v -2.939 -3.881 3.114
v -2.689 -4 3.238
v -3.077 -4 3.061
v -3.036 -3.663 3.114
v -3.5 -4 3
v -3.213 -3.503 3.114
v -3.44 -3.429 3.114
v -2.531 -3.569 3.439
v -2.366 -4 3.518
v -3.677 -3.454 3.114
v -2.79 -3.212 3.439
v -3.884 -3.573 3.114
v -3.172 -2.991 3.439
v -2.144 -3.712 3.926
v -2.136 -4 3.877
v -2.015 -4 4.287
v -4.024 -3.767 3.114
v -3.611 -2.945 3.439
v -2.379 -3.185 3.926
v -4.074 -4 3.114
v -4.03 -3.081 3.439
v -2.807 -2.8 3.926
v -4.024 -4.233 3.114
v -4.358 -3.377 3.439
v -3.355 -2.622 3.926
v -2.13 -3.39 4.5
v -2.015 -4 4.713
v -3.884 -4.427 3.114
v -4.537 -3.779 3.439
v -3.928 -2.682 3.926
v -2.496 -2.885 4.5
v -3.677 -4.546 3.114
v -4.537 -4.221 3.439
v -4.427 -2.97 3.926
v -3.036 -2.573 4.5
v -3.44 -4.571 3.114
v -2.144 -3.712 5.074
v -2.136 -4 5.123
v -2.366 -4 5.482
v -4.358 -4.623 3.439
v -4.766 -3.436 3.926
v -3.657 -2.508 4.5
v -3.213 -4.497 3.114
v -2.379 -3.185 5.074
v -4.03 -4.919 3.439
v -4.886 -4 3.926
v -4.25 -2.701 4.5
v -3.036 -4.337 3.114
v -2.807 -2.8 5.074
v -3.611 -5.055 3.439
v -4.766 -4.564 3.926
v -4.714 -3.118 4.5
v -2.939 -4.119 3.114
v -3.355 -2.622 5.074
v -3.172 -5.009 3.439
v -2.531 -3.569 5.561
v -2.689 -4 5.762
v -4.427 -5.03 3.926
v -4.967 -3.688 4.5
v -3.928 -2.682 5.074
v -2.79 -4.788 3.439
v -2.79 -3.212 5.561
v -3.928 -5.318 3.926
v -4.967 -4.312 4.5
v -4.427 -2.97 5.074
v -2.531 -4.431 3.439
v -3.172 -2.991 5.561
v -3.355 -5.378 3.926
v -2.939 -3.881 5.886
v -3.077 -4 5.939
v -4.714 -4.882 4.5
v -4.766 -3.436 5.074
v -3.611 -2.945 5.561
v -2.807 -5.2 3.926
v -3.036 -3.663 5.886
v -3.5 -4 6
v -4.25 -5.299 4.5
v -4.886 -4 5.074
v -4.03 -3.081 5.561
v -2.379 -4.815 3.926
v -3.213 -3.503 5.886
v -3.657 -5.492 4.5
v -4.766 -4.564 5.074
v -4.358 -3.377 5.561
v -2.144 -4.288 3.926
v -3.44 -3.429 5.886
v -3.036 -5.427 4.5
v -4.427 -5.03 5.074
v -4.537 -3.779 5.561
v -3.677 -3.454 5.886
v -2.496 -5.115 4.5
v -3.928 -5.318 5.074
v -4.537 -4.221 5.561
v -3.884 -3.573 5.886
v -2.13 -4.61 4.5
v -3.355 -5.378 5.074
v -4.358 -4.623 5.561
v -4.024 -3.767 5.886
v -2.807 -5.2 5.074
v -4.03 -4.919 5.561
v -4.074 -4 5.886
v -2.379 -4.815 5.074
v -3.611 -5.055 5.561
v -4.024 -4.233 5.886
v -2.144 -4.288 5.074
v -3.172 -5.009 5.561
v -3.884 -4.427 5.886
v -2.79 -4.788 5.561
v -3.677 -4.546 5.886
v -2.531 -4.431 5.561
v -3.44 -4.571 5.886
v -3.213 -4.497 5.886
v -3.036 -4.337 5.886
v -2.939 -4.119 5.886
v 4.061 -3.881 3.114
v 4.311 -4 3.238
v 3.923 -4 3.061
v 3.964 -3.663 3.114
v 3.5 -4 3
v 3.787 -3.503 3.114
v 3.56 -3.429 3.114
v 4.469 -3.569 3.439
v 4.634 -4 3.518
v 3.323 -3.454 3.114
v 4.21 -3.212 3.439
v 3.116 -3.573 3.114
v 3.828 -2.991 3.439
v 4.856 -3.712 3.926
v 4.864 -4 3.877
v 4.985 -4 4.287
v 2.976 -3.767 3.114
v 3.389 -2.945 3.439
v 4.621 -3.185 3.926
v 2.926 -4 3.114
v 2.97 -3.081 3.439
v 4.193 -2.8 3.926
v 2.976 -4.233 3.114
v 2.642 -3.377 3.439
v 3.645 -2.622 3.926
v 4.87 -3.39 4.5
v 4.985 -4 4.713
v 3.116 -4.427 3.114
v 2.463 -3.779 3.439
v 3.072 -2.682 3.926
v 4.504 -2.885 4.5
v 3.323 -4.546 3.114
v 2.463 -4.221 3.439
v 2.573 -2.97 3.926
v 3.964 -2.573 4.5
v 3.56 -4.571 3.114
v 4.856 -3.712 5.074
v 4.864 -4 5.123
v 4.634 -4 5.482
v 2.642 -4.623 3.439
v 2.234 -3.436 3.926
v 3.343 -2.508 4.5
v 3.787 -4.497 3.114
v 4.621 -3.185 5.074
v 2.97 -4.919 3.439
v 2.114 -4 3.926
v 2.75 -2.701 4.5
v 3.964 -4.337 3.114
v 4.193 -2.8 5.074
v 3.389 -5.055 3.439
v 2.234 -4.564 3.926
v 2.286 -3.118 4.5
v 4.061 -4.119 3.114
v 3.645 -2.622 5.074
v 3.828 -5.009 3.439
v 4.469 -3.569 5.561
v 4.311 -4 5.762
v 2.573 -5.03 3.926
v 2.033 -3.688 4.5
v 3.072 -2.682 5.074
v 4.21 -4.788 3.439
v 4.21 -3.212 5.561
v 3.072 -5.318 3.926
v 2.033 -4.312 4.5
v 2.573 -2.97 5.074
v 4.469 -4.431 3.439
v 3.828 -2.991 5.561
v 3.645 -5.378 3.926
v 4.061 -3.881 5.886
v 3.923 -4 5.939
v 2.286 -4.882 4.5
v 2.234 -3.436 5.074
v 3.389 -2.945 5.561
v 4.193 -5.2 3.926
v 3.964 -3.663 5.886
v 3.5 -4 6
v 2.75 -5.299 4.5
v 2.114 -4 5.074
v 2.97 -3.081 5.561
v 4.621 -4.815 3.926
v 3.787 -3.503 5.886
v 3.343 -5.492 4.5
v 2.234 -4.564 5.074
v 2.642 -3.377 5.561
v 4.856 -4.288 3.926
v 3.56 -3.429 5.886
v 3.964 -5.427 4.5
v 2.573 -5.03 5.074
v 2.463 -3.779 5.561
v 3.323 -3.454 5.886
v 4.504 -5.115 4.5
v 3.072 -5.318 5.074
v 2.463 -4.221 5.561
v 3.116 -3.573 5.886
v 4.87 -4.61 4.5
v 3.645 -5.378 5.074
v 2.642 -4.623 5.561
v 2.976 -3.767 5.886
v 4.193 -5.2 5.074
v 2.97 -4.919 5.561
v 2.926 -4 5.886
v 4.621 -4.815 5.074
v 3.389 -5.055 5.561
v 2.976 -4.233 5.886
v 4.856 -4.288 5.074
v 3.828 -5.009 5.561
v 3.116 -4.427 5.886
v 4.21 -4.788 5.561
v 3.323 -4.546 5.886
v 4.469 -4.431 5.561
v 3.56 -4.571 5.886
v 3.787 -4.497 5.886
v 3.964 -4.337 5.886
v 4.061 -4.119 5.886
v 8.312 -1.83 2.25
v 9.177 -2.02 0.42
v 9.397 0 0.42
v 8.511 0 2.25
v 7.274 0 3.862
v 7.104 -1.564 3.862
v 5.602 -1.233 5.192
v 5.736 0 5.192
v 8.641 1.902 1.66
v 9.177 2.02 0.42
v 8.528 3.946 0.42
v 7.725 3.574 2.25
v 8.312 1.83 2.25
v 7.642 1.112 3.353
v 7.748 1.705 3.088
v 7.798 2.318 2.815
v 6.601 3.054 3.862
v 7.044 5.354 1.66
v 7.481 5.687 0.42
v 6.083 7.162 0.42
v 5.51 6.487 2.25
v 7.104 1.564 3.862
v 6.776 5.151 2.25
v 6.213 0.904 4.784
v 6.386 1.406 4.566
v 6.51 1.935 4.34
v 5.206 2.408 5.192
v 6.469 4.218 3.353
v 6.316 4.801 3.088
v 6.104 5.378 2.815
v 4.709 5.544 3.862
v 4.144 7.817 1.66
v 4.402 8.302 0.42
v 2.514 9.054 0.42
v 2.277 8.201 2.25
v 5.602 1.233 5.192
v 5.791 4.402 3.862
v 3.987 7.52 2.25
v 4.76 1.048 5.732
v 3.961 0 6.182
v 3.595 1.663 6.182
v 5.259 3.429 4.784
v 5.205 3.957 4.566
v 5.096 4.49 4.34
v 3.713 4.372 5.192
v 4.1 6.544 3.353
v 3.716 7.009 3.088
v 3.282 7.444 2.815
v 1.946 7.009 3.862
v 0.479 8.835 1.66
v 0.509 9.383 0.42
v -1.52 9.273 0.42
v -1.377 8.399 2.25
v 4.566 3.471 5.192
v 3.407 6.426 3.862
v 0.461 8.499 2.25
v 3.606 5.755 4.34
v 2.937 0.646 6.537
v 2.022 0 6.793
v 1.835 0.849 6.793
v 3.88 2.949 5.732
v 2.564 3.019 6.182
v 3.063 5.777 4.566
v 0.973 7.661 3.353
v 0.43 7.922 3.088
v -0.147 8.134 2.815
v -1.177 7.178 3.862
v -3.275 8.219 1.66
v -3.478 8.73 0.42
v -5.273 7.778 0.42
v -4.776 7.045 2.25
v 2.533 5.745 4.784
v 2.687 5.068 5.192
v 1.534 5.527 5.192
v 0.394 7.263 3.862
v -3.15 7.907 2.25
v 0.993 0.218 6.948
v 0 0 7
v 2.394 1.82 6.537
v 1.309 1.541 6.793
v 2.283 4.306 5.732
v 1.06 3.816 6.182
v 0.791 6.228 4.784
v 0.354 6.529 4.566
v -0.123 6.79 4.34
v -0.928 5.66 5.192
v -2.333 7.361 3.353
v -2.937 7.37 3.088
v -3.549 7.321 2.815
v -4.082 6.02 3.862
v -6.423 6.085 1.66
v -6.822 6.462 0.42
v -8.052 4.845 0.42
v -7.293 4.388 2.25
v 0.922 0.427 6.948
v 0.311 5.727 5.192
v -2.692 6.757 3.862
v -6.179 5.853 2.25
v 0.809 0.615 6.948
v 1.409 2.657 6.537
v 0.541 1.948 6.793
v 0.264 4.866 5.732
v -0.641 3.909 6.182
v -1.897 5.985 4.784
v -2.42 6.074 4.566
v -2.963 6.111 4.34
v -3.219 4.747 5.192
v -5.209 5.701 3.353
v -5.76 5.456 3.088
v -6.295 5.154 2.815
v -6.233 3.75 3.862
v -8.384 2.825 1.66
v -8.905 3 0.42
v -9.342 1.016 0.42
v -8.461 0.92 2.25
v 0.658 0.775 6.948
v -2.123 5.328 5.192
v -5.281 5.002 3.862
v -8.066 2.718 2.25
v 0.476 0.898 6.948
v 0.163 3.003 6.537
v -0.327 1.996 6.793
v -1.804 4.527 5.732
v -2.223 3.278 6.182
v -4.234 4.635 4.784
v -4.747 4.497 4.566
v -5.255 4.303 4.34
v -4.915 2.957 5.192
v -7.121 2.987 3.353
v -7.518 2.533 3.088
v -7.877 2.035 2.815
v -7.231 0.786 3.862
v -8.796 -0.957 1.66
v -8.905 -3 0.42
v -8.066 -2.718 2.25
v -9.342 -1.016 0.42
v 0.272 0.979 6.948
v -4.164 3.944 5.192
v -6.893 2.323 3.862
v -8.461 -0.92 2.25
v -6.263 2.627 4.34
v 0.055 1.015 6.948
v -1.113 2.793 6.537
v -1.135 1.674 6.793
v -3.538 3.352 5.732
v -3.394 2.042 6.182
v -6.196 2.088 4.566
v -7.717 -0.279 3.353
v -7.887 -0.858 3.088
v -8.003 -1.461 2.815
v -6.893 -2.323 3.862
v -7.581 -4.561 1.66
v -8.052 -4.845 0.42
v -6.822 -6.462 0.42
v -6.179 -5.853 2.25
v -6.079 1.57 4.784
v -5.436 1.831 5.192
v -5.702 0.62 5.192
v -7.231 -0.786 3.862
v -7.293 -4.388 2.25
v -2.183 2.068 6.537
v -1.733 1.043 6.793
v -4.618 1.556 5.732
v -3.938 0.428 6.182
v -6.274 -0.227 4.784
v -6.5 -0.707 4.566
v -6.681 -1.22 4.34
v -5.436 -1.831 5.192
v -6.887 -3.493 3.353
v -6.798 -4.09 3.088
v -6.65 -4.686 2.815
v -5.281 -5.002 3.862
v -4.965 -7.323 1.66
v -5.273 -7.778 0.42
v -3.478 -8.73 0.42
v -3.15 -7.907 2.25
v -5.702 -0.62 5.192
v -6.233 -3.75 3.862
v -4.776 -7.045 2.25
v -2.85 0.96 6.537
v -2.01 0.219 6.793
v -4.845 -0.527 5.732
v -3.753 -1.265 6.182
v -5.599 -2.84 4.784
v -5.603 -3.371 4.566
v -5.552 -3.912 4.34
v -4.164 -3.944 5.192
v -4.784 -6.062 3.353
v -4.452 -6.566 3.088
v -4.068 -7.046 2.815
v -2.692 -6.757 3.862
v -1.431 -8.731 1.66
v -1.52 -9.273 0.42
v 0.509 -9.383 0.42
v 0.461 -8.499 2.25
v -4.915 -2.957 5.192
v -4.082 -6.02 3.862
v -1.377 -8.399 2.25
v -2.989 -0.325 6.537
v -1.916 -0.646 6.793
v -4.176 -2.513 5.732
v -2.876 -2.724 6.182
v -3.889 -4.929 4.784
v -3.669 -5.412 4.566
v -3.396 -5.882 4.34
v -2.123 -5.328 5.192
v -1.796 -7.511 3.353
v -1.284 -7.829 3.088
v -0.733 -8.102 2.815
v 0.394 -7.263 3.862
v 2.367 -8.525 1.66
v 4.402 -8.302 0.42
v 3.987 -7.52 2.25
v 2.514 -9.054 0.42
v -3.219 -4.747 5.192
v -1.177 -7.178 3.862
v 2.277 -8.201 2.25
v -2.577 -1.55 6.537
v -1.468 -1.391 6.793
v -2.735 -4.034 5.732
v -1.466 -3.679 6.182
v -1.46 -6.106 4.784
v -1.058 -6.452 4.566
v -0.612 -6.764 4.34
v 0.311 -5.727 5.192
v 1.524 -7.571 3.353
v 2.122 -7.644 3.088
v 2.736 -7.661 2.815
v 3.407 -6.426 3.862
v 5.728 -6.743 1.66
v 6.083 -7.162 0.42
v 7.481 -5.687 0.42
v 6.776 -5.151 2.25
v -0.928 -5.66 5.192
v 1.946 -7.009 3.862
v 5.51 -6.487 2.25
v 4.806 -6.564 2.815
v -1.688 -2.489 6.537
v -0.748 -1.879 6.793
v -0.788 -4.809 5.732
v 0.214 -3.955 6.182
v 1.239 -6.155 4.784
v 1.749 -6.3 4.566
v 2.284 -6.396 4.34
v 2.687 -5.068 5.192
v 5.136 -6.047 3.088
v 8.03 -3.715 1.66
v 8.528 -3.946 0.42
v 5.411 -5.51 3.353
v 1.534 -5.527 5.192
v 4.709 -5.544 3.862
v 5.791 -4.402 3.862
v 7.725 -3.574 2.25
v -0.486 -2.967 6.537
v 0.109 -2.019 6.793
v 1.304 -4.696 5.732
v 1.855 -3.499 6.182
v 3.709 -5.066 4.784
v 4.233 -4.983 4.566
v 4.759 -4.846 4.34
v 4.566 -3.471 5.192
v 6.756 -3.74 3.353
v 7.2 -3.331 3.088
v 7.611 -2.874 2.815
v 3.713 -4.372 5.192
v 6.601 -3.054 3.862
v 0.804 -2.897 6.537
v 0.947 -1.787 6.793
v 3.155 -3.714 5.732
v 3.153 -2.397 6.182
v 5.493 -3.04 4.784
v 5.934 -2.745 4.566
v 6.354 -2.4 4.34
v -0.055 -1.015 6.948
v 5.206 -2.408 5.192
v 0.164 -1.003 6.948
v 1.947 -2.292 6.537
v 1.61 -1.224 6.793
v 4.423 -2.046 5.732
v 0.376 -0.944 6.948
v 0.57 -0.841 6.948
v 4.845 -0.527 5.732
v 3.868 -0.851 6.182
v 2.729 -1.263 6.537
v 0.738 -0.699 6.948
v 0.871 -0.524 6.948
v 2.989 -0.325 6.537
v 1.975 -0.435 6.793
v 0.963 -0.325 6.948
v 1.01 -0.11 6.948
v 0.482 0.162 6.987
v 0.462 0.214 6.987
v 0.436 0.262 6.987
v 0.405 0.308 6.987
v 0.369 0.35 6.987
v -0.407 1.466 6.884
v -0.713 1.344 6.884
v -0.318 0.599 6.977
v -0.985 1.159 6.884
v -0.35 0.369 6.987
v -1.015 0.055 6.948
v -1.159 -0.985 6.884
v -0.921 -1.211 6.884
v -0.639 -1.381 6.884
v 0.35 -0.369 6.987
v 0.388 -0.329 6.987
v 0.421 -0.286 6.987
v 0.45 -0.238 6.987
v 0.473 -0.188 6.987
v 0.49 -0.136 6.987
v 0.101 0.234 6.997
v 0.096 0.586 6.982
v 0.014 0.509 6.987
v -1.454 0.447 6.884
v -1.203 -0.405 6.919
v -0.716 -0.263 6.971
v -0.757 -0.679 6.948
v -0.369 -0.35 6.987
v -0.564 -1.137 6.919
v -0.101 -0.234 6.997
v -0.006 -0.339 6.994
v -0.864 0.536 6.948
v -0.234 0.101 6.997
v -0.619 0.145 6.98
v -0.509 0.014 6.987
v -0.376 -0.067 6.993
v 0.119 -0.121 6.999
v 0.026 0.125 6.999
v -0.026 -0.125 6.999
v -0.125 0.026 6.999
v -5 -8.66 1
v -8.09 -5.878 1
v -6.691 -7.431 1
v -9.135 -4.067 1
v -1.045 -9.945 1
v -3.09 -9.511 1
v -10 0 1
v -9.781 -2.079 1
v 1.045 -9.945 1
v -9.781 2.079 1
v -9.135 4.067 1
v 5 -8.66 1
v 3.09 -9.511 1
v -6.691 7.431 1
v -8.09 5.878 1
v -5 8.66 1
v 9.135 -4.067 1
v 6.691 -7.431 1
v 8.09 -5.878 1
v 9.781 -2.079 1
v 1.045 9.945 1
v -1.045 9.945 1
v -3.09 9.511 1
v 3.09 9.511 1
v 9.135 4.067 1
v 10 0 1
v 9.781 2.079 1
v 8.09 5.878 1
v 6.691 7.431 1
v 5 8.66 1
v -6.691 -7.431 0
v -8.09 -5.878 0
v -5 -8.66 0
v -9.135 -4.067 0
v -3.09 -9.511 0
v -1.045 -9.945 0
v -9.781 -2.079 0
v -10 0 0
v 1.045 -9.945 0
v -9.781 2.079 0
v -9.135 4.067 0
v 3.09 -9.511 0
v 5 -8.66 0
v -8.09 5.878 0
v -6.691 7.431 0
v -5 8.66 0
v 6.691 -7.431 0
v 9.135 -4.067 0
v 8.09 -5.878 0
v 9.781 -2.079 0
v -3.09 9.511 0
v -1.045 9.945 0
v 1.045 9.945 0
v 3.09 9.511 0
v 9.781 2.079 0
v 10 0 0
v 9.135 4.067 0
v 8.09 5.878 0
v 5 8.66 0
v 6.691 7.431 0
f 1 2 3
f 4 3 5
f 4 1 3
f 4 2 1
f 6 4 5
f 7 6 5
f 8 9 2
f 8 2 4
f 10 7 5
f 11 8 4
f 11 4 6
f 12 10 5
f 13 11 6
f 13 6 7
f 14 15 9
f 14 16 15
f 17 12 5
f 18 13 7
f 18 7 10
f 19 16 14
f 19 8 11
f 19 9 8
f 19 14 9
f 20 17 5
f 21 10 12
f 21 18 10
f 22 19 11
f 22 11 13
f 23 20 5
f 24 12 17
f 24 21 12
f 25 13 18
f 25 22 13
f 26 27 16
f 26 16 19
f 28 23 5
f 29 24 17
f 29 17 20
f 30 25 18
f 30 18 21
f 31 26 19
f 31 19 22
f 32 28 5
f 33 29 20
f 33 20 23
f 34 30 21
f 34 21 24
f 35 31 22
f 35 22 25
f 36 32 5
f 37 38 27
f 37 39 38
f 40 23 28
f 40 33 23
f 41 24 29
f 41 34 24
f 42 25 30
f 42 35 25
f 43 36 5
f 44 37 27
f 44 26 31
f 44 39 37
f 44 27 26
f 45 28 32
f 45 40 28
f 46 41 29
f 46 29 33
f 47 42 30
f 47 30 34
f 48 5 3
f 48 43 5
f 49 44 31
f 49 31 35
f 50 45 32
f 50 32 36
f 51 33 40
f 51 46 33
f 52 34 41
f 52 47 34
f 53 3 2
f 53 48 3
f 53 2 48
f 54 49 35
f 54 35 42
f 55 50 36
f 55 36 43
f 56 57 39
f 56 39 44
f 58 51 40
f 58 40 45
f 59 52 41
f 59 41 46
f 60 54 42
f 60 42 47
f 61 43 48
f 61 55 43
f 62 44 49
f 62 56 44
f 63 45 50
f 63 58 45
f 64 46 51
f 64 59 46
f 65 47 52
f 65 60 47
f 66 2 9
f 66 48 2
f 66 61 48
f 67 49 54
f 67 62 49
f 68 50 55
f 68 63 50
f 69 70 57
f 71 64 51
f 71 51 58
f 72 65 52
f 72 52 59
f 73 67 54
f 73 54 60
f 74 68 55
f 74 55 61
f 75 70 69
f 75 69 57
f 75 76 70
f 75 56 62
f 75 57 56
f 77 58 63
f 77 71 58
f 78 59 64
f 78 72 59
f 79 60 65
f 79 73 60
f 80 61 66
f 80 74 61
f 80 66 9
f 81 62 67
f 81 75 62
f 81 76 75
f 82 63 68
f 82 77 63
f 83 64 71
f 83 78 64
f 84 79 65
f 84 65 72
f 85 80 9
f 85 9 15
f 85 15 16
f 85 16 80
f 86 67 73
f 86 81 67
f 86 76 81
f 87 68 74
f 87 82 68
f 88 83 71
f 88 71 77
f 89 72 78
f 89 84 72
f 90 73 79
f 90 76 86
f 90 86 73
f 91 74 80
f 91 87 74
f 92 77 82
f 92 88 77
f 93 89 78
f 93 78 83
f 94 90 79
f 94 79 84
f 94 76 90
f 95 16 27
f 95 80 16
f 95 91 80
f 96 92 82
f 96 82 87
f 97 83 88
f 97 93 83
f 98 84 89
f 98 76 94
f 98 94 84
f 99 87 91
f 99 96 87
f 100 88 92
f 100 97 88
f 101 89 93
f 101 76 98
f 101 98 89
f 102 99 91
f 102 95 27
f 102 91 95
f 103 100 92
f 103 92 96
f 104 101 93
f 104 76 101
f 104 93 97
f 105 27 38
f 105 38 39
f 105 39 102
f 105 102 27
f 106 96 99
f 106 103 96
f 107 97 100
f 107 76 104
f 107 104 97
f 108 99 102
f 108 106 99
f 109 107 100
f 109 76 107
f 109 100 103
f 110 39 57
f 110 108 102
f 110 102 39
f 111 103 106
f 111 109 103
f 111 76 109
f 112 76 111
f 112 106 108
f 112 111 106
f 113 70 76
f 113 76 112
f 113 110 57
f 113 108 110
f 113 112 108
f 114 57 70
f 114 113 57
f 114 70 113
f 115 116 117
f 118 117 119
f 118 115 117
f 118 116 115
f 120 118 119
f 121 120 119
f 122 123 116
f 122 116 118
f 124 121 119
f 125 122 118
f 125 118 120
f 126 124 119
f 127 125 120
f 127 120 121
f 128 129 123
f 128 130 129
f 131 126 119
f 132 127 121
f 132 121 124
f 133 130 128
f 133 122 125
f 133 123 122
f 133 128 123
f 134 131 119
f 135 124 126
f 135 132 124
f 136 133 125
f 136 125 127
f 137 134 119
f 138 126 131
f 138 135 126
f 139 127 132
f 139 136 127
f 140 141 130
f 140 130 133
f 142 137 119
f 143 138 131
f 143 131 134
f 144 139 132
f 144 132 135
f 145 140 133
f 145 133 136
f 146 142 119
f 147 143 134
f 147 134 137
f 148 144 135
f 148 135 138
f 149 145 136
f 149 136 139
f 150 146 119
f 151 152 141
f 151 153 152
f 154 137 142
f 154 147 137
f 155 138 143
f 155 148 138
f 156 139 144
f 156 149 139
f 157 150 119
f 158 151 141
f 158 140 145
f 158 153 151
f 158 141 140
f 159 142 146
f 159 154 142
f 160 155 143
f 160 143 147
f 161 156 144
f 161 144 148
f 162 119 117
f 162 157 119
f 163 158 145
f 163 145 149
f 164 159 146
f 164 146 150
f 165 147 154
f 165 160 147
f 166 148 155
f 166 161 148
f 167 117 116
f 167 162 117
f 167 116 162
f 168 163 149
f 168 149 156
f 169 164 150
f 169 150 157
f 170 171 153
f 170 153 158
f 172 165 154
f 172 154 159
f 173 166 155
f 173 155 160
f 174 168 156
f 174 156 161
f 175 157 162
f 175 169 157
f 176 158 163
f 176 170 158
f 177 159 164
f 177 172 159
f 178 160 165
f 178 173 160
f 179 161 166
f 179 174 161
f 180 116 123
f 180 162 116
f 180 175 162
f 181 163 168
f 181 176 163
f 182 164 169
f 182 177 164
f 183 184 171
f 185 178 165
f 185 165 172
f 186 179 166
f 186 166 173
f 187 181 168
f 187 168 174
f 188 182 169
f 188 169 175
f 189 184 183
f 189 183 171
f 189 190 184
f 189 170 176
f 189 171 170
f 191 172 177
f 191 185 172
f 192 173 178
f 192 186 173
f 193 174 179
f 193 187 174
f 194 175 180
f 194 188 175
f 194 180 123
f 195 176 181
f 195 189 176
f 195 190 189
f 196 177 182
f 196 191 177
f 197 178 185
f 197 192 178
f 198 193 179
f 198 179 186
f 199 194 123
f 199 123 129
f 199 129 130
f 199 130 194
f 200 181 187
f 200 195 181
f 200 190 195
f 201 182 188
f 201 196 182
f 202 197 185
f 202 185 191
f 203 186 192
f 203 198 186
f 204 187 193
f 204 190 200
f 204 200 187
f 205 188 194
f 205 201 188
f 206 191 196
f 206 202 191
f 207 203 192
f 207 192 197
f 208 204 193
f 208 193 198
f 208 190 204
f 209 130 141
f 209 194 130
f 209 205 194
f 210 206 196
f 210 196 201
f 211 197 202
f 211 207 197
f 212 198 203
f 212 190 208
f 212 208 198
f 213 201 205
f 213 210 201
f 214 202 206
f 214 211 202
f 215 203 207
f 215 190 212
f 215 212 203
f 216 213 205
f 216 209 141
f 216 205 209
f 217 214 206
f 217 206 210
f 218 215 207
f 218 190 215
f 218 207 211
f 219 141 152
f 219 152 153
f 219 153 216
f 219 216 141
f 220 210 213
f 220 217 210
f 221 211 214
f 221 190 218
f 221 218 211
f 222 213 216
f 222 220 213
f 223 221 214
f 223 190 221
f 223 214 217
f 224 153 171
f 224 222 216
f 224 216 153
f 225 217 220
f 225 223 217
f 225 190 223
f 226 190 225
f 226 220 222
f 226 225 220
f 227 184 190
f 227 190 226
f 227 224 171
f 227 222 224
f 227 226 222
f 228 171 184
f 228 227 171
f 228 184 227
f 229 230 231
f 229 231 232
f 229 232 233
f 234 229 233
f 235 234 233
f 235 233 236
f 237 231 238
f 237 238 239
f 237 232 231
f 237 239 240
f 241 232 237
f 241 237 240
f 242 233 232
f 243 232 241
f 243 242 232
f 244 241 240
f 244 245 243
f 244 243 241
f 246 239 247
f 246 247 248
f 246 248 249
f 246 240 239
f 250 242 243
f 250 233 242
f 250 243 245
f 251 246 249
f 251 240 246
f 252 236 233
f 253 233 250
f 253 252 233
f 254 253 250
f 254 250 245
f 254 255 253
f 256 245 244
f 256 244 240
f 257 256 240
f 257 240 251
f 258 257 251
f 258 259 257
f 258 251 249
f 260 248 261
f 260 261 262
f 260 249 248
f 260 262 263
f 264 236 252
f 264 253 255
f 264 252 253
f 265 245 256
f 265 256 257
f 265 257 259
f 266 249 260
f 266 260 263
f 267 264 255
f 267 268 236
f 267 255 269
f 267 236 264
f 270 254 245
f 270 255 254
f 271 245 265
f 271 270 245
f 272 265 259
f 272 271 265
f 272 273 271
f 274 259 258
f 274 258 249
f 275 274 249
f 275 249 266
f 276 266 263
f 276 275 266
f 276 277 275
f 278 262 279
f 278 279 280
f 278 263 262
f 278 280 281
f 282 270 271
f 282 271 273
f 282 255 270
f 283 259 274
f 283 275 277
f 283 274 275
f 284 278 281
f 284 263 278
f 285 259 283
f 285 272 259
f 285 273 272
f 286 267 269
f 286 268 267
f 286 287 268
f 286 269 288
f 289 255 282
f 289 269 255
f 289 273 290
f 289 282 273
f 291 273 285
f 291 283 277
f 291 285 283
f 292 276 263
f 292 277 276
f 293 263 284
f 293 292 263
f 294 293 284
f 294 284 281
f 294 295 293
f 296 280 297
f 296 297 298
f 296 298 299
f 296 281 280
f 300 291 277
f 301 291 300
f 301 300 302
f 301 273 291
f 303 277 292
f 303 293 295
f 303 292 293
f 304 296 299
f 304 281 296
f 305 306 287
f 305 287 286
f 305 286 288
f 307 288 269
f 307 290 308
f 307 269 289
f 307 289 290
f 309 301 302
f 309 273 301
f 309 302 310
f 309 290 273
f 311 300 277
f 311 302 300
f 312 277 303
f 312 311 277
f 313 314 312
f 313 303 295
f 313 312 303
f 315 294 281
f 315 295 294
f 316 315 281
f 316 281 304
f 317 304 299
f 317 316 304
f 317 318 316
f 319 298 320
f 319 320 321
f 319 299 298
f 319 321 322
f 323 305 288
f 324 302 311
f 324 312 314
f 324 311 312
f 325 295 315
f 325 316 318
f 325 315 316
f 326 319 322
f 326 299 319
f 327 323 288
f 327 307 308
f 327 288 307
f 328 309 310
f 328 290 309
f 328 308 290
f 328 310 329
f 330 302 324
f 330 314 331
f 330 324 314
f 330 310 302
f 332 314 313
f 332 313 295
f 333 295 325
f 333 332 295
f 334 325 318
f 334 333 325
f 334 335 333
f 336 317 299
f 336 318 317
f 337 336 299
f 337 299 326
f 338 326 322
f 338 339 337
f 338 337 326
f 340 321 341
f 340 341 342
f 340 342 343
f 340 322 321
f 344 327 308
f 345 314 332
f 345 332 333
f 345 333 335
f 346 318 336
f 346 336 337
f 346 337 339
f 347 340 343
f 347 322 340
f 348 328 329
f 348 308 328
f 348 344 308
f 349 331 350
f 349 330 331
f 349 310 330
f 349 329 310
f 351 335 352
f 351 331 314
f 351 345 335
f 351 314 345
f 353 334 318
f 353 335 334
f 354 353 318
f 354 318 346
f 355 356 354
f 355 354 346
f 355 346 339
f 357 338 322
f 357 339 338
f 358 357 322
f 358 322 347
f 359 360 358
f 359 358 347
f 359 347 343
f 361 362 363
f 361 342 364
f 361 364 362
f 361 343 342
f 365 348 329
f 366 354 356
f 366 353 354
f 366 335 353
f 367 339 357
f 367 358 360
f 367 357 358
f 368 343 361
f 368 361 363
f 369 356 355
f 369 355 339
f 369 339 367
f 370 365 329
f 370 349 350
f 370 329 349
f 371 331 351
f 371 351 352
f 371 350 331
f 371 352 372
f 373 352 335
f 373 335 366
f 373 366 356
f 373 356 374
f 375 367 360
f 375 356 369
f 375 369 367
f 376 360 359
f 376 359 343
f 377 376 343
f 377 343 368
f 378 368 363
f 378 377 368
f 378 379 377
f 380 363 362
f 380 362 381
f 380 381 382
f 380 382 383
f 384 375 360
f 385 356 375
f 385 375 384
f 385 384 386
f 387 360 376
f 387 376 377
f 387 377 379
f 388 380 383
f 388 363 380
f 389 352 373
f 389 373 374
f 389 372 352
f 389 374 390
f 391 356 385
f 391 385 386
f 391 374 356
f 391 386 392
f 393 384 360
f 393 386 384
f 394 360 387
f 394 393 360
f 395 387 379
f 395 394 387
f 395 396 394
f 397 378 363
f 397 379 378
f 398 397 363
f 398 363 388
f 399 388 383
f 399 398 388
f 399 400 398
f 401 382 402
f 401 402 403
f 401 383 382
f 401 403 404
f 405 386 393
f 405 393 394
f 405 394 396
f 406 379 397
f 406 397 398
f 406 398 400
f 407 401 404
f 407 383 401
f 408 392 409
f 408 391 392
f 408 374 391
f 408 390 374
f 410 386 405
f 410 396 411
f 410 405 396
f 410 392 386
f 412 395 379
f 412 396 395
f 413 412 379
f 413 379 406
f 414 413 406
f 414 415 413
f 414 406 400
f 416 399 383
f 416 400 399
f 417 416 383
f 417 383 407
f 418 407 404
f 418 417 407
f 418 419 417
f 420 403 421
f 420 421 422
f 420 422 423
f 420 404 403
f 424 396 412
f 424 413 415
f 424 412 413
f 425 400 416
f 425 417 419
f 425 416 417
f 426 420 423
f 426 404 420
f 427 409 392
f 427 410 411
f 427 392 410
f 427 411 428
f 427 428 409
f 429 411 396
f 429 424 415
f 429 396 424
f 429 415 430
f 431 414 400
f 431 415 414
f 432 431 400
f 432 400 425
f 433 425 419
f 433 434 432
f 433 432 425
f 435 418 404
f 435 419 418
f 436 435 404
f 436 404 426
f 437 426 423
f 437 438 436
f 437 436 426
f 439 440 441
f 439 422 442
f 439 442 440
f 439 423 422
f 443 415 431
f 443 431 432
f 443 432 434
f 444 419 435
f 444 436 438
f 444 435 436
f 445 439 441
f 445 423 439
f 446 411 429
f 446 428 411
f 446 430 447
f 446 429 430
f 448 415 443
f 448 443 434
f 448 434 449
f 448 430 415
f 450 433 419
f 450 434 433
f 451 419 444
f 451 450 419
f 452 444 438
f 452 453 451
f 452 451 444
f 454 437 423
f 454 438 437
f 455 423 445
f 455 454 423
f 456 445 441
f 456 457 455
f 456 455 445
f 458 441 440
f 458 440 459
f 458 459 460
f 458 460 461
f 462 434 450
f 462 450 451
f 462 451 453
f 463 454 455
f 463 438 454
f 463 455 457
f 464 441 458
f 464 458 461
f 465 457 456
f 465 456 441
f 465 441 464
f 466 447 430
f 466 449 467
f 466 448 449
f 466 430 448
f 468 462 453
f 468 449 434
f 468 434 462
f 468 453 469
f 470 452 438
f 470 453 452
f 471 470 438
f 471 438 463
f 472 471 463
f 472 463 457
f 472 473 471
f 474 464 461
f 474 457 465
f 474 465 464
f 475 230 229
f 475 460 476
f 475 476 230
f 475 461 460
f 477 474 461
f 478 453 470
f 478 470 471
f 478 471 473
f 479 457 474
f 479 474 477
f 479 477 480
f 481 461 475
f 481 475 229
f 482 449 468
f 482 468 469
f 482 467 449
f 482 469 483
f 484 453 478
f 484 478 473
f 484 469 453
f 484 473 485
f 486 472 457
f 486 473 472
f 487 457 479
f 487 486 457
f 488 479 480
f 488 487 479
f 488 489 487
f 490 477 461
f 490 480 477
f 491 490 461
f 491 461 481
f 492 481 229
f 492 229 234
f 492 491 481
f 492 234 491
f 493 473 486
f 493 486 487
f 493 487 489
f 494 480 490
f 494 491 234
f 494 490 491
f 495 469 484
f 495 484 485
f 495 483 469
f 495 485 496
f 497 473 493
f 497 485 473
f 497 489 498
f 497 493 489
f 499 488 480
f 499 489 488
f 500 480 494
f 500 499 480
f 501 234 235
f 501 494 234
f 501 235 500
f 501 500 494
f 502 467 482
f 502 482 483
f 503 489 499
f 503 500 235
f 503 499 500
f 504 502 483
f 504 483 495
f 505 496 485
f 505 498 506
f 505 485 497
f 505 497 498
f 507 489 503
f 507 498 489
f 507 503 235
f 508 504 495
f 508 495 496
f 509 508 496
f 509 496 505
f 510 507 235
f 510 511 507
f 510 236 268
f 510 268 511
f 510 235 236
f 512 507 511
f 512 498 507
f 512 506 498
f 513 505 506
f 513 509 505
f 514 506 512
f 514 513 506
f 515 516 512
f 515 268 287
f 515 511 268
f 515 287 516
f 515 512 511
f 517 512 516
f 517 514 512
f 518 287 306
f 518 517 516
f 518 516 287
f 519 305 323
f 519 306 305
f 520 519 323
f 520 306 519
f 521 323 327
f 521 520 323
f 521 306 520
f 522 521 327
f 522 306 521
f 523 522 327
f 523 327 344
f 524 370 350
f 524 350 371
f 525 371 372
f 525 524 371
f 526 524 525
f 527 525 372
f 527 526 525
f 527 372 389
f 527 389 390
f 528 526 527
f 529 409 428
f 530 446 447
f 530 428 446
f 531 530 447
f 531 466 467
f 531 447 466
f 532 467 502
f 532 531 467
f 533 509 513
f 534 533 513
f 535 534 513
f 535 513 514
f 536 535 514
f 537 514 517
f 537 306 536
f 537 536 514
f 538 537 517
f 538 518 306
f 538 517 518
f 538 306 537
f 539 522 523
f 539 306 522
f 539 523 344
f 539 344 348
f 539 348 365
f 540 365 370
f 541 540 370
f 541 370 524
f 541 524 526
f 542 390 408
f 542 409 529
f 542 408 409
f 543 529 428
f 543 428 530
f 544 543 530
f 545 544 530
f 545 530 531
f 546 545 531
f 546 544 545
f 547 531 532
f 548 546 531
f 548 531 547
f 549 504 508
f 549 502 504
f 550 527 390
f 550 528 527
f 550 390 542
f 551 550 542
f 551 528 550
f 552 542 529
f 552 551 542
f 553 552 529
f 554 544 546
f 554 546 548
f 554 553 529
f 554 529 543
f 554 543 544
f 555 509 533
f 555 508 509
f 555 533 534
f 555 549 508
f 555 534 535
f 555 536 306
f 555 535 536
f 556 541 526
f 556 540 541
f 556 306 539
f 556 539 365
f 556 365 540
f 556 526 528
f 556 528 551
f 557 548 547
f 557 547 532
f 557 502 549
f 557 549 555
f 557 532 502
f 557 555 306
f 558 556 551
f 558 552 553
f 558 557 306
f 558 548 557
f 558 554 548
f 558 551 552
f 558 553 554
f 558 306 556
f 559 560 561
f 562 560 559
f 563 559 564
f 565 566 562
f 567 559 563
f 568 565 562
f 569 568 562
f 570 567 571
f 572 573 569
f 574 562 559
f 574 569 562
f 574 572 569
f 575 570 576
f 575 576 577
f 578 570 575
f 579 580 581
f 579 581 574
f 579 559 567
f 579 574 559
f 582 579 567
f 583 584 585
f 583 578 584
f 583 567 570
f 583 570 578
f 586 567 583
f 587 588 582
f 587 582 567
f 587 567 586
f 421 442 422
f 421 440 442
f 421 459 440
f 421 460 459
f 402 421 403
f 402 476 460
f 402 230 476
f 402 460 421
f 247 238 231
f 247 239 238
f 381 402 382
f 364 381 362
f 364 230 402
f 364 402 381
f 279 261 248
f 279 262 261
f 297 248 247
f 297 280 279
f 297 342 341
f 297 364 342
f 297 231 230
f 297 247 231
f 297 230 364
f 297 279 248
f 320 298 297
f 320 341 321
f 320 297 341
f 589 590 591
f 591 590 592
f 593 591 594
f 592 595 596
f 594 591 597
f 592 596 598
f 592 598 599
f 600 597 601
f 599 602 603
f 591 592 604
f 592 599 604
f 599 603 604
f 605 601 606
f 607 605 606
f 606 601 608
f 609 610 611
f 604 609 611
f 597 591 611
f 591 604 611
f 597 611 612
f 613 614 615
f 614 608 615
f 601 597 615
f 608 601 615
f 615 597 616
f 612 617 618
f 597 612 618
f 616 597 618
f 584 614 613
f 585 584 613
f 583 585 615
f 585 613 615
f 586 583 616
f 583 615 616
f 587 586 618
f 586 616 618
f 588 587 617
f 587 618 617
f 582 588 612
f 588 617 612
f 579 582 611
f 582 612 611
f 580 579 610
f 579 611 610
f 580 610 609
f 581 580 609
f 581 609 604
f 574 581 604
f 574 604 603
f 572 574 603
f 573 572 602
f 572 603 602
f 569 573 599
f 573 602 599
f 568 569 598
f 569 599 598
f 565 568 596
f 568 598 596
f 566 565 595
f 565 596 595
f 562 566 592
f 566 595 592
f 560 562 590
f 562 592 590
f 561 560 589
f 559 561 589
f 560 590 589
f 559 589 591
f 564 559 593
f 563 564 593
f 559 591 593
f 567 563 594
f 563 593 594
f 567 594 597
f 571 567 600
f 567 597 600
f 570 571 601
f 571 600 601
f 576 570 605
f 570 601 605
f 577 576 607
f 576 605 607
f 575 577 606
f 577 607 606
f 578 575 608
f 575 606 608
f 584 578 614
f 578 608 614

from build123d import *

# Parameters (mm, degrees)
CYLINDER_R     = 10
CYLINDER_DEPTH = 1


with BuildPart() as cylinder:
    # Cylinder → Cylinder (new body)
    with BuildSketch(Plane.XY):
        Circle(CYLINDER_R)
    extrude(amount=CYLINDER_DEPTH)


with BuildPart() as sphere:
    # Sphere → Sphere (revolve)
    with BuildSketch(Plane(origin=(0, 0, -3), x_dir=(1, 0, 0), z_dir=(0, -1, 0))):
        with BuildLine():
            ThreePointArc((9.396926, 3.420201), (5.735764, 8.19152), (0, 10))
            Line((0, 10), (0, 3.420201))
            Line((0, 3.420201), (9.396926, 3.420201))
        make_face()
    revolve(axis=Axis((0, 0, -3), (0, 0, 1)))


with BuildPart() as sphere001:
    # Sphere001 → Sphere001 (revolve)
    with BuildSketch(Plane(origin=(-3.5, -4, 4.5), x_dir=(1, 0, 0), z_dir=(0, -1, 0))):
        with BuildLine():
            ThreePointArc((0, -1.5), (1.5, 0), (0, 1.5))
            Line((0, 1.5), (0, -1.5))
        make_face()
    revolve(axis=Axis((-3.5, -4, 4.5), (0, 0, 1)))


with BuildPart() as sphere002:
    # Sphere002 → Sphere002 (revolve)
    with BuildSketch(Plane(origin=(3.5, -4, 4.5), x_dir=(1, 0, 0), z_dir=(0, -1, 0))):
        with BuildLine():
            ThreePointArc((0, -1.5), (1.5, 0), (0, 1.5))
            Line((0, 1.5), (0, -1.5))
        make_face()
    revolve(axis=Axis((3.5, -4, 4.5), (0, 0, 1)))


solid = Compound([cylinder.part, sphere.part, sphere001.part, sphere002.part])
